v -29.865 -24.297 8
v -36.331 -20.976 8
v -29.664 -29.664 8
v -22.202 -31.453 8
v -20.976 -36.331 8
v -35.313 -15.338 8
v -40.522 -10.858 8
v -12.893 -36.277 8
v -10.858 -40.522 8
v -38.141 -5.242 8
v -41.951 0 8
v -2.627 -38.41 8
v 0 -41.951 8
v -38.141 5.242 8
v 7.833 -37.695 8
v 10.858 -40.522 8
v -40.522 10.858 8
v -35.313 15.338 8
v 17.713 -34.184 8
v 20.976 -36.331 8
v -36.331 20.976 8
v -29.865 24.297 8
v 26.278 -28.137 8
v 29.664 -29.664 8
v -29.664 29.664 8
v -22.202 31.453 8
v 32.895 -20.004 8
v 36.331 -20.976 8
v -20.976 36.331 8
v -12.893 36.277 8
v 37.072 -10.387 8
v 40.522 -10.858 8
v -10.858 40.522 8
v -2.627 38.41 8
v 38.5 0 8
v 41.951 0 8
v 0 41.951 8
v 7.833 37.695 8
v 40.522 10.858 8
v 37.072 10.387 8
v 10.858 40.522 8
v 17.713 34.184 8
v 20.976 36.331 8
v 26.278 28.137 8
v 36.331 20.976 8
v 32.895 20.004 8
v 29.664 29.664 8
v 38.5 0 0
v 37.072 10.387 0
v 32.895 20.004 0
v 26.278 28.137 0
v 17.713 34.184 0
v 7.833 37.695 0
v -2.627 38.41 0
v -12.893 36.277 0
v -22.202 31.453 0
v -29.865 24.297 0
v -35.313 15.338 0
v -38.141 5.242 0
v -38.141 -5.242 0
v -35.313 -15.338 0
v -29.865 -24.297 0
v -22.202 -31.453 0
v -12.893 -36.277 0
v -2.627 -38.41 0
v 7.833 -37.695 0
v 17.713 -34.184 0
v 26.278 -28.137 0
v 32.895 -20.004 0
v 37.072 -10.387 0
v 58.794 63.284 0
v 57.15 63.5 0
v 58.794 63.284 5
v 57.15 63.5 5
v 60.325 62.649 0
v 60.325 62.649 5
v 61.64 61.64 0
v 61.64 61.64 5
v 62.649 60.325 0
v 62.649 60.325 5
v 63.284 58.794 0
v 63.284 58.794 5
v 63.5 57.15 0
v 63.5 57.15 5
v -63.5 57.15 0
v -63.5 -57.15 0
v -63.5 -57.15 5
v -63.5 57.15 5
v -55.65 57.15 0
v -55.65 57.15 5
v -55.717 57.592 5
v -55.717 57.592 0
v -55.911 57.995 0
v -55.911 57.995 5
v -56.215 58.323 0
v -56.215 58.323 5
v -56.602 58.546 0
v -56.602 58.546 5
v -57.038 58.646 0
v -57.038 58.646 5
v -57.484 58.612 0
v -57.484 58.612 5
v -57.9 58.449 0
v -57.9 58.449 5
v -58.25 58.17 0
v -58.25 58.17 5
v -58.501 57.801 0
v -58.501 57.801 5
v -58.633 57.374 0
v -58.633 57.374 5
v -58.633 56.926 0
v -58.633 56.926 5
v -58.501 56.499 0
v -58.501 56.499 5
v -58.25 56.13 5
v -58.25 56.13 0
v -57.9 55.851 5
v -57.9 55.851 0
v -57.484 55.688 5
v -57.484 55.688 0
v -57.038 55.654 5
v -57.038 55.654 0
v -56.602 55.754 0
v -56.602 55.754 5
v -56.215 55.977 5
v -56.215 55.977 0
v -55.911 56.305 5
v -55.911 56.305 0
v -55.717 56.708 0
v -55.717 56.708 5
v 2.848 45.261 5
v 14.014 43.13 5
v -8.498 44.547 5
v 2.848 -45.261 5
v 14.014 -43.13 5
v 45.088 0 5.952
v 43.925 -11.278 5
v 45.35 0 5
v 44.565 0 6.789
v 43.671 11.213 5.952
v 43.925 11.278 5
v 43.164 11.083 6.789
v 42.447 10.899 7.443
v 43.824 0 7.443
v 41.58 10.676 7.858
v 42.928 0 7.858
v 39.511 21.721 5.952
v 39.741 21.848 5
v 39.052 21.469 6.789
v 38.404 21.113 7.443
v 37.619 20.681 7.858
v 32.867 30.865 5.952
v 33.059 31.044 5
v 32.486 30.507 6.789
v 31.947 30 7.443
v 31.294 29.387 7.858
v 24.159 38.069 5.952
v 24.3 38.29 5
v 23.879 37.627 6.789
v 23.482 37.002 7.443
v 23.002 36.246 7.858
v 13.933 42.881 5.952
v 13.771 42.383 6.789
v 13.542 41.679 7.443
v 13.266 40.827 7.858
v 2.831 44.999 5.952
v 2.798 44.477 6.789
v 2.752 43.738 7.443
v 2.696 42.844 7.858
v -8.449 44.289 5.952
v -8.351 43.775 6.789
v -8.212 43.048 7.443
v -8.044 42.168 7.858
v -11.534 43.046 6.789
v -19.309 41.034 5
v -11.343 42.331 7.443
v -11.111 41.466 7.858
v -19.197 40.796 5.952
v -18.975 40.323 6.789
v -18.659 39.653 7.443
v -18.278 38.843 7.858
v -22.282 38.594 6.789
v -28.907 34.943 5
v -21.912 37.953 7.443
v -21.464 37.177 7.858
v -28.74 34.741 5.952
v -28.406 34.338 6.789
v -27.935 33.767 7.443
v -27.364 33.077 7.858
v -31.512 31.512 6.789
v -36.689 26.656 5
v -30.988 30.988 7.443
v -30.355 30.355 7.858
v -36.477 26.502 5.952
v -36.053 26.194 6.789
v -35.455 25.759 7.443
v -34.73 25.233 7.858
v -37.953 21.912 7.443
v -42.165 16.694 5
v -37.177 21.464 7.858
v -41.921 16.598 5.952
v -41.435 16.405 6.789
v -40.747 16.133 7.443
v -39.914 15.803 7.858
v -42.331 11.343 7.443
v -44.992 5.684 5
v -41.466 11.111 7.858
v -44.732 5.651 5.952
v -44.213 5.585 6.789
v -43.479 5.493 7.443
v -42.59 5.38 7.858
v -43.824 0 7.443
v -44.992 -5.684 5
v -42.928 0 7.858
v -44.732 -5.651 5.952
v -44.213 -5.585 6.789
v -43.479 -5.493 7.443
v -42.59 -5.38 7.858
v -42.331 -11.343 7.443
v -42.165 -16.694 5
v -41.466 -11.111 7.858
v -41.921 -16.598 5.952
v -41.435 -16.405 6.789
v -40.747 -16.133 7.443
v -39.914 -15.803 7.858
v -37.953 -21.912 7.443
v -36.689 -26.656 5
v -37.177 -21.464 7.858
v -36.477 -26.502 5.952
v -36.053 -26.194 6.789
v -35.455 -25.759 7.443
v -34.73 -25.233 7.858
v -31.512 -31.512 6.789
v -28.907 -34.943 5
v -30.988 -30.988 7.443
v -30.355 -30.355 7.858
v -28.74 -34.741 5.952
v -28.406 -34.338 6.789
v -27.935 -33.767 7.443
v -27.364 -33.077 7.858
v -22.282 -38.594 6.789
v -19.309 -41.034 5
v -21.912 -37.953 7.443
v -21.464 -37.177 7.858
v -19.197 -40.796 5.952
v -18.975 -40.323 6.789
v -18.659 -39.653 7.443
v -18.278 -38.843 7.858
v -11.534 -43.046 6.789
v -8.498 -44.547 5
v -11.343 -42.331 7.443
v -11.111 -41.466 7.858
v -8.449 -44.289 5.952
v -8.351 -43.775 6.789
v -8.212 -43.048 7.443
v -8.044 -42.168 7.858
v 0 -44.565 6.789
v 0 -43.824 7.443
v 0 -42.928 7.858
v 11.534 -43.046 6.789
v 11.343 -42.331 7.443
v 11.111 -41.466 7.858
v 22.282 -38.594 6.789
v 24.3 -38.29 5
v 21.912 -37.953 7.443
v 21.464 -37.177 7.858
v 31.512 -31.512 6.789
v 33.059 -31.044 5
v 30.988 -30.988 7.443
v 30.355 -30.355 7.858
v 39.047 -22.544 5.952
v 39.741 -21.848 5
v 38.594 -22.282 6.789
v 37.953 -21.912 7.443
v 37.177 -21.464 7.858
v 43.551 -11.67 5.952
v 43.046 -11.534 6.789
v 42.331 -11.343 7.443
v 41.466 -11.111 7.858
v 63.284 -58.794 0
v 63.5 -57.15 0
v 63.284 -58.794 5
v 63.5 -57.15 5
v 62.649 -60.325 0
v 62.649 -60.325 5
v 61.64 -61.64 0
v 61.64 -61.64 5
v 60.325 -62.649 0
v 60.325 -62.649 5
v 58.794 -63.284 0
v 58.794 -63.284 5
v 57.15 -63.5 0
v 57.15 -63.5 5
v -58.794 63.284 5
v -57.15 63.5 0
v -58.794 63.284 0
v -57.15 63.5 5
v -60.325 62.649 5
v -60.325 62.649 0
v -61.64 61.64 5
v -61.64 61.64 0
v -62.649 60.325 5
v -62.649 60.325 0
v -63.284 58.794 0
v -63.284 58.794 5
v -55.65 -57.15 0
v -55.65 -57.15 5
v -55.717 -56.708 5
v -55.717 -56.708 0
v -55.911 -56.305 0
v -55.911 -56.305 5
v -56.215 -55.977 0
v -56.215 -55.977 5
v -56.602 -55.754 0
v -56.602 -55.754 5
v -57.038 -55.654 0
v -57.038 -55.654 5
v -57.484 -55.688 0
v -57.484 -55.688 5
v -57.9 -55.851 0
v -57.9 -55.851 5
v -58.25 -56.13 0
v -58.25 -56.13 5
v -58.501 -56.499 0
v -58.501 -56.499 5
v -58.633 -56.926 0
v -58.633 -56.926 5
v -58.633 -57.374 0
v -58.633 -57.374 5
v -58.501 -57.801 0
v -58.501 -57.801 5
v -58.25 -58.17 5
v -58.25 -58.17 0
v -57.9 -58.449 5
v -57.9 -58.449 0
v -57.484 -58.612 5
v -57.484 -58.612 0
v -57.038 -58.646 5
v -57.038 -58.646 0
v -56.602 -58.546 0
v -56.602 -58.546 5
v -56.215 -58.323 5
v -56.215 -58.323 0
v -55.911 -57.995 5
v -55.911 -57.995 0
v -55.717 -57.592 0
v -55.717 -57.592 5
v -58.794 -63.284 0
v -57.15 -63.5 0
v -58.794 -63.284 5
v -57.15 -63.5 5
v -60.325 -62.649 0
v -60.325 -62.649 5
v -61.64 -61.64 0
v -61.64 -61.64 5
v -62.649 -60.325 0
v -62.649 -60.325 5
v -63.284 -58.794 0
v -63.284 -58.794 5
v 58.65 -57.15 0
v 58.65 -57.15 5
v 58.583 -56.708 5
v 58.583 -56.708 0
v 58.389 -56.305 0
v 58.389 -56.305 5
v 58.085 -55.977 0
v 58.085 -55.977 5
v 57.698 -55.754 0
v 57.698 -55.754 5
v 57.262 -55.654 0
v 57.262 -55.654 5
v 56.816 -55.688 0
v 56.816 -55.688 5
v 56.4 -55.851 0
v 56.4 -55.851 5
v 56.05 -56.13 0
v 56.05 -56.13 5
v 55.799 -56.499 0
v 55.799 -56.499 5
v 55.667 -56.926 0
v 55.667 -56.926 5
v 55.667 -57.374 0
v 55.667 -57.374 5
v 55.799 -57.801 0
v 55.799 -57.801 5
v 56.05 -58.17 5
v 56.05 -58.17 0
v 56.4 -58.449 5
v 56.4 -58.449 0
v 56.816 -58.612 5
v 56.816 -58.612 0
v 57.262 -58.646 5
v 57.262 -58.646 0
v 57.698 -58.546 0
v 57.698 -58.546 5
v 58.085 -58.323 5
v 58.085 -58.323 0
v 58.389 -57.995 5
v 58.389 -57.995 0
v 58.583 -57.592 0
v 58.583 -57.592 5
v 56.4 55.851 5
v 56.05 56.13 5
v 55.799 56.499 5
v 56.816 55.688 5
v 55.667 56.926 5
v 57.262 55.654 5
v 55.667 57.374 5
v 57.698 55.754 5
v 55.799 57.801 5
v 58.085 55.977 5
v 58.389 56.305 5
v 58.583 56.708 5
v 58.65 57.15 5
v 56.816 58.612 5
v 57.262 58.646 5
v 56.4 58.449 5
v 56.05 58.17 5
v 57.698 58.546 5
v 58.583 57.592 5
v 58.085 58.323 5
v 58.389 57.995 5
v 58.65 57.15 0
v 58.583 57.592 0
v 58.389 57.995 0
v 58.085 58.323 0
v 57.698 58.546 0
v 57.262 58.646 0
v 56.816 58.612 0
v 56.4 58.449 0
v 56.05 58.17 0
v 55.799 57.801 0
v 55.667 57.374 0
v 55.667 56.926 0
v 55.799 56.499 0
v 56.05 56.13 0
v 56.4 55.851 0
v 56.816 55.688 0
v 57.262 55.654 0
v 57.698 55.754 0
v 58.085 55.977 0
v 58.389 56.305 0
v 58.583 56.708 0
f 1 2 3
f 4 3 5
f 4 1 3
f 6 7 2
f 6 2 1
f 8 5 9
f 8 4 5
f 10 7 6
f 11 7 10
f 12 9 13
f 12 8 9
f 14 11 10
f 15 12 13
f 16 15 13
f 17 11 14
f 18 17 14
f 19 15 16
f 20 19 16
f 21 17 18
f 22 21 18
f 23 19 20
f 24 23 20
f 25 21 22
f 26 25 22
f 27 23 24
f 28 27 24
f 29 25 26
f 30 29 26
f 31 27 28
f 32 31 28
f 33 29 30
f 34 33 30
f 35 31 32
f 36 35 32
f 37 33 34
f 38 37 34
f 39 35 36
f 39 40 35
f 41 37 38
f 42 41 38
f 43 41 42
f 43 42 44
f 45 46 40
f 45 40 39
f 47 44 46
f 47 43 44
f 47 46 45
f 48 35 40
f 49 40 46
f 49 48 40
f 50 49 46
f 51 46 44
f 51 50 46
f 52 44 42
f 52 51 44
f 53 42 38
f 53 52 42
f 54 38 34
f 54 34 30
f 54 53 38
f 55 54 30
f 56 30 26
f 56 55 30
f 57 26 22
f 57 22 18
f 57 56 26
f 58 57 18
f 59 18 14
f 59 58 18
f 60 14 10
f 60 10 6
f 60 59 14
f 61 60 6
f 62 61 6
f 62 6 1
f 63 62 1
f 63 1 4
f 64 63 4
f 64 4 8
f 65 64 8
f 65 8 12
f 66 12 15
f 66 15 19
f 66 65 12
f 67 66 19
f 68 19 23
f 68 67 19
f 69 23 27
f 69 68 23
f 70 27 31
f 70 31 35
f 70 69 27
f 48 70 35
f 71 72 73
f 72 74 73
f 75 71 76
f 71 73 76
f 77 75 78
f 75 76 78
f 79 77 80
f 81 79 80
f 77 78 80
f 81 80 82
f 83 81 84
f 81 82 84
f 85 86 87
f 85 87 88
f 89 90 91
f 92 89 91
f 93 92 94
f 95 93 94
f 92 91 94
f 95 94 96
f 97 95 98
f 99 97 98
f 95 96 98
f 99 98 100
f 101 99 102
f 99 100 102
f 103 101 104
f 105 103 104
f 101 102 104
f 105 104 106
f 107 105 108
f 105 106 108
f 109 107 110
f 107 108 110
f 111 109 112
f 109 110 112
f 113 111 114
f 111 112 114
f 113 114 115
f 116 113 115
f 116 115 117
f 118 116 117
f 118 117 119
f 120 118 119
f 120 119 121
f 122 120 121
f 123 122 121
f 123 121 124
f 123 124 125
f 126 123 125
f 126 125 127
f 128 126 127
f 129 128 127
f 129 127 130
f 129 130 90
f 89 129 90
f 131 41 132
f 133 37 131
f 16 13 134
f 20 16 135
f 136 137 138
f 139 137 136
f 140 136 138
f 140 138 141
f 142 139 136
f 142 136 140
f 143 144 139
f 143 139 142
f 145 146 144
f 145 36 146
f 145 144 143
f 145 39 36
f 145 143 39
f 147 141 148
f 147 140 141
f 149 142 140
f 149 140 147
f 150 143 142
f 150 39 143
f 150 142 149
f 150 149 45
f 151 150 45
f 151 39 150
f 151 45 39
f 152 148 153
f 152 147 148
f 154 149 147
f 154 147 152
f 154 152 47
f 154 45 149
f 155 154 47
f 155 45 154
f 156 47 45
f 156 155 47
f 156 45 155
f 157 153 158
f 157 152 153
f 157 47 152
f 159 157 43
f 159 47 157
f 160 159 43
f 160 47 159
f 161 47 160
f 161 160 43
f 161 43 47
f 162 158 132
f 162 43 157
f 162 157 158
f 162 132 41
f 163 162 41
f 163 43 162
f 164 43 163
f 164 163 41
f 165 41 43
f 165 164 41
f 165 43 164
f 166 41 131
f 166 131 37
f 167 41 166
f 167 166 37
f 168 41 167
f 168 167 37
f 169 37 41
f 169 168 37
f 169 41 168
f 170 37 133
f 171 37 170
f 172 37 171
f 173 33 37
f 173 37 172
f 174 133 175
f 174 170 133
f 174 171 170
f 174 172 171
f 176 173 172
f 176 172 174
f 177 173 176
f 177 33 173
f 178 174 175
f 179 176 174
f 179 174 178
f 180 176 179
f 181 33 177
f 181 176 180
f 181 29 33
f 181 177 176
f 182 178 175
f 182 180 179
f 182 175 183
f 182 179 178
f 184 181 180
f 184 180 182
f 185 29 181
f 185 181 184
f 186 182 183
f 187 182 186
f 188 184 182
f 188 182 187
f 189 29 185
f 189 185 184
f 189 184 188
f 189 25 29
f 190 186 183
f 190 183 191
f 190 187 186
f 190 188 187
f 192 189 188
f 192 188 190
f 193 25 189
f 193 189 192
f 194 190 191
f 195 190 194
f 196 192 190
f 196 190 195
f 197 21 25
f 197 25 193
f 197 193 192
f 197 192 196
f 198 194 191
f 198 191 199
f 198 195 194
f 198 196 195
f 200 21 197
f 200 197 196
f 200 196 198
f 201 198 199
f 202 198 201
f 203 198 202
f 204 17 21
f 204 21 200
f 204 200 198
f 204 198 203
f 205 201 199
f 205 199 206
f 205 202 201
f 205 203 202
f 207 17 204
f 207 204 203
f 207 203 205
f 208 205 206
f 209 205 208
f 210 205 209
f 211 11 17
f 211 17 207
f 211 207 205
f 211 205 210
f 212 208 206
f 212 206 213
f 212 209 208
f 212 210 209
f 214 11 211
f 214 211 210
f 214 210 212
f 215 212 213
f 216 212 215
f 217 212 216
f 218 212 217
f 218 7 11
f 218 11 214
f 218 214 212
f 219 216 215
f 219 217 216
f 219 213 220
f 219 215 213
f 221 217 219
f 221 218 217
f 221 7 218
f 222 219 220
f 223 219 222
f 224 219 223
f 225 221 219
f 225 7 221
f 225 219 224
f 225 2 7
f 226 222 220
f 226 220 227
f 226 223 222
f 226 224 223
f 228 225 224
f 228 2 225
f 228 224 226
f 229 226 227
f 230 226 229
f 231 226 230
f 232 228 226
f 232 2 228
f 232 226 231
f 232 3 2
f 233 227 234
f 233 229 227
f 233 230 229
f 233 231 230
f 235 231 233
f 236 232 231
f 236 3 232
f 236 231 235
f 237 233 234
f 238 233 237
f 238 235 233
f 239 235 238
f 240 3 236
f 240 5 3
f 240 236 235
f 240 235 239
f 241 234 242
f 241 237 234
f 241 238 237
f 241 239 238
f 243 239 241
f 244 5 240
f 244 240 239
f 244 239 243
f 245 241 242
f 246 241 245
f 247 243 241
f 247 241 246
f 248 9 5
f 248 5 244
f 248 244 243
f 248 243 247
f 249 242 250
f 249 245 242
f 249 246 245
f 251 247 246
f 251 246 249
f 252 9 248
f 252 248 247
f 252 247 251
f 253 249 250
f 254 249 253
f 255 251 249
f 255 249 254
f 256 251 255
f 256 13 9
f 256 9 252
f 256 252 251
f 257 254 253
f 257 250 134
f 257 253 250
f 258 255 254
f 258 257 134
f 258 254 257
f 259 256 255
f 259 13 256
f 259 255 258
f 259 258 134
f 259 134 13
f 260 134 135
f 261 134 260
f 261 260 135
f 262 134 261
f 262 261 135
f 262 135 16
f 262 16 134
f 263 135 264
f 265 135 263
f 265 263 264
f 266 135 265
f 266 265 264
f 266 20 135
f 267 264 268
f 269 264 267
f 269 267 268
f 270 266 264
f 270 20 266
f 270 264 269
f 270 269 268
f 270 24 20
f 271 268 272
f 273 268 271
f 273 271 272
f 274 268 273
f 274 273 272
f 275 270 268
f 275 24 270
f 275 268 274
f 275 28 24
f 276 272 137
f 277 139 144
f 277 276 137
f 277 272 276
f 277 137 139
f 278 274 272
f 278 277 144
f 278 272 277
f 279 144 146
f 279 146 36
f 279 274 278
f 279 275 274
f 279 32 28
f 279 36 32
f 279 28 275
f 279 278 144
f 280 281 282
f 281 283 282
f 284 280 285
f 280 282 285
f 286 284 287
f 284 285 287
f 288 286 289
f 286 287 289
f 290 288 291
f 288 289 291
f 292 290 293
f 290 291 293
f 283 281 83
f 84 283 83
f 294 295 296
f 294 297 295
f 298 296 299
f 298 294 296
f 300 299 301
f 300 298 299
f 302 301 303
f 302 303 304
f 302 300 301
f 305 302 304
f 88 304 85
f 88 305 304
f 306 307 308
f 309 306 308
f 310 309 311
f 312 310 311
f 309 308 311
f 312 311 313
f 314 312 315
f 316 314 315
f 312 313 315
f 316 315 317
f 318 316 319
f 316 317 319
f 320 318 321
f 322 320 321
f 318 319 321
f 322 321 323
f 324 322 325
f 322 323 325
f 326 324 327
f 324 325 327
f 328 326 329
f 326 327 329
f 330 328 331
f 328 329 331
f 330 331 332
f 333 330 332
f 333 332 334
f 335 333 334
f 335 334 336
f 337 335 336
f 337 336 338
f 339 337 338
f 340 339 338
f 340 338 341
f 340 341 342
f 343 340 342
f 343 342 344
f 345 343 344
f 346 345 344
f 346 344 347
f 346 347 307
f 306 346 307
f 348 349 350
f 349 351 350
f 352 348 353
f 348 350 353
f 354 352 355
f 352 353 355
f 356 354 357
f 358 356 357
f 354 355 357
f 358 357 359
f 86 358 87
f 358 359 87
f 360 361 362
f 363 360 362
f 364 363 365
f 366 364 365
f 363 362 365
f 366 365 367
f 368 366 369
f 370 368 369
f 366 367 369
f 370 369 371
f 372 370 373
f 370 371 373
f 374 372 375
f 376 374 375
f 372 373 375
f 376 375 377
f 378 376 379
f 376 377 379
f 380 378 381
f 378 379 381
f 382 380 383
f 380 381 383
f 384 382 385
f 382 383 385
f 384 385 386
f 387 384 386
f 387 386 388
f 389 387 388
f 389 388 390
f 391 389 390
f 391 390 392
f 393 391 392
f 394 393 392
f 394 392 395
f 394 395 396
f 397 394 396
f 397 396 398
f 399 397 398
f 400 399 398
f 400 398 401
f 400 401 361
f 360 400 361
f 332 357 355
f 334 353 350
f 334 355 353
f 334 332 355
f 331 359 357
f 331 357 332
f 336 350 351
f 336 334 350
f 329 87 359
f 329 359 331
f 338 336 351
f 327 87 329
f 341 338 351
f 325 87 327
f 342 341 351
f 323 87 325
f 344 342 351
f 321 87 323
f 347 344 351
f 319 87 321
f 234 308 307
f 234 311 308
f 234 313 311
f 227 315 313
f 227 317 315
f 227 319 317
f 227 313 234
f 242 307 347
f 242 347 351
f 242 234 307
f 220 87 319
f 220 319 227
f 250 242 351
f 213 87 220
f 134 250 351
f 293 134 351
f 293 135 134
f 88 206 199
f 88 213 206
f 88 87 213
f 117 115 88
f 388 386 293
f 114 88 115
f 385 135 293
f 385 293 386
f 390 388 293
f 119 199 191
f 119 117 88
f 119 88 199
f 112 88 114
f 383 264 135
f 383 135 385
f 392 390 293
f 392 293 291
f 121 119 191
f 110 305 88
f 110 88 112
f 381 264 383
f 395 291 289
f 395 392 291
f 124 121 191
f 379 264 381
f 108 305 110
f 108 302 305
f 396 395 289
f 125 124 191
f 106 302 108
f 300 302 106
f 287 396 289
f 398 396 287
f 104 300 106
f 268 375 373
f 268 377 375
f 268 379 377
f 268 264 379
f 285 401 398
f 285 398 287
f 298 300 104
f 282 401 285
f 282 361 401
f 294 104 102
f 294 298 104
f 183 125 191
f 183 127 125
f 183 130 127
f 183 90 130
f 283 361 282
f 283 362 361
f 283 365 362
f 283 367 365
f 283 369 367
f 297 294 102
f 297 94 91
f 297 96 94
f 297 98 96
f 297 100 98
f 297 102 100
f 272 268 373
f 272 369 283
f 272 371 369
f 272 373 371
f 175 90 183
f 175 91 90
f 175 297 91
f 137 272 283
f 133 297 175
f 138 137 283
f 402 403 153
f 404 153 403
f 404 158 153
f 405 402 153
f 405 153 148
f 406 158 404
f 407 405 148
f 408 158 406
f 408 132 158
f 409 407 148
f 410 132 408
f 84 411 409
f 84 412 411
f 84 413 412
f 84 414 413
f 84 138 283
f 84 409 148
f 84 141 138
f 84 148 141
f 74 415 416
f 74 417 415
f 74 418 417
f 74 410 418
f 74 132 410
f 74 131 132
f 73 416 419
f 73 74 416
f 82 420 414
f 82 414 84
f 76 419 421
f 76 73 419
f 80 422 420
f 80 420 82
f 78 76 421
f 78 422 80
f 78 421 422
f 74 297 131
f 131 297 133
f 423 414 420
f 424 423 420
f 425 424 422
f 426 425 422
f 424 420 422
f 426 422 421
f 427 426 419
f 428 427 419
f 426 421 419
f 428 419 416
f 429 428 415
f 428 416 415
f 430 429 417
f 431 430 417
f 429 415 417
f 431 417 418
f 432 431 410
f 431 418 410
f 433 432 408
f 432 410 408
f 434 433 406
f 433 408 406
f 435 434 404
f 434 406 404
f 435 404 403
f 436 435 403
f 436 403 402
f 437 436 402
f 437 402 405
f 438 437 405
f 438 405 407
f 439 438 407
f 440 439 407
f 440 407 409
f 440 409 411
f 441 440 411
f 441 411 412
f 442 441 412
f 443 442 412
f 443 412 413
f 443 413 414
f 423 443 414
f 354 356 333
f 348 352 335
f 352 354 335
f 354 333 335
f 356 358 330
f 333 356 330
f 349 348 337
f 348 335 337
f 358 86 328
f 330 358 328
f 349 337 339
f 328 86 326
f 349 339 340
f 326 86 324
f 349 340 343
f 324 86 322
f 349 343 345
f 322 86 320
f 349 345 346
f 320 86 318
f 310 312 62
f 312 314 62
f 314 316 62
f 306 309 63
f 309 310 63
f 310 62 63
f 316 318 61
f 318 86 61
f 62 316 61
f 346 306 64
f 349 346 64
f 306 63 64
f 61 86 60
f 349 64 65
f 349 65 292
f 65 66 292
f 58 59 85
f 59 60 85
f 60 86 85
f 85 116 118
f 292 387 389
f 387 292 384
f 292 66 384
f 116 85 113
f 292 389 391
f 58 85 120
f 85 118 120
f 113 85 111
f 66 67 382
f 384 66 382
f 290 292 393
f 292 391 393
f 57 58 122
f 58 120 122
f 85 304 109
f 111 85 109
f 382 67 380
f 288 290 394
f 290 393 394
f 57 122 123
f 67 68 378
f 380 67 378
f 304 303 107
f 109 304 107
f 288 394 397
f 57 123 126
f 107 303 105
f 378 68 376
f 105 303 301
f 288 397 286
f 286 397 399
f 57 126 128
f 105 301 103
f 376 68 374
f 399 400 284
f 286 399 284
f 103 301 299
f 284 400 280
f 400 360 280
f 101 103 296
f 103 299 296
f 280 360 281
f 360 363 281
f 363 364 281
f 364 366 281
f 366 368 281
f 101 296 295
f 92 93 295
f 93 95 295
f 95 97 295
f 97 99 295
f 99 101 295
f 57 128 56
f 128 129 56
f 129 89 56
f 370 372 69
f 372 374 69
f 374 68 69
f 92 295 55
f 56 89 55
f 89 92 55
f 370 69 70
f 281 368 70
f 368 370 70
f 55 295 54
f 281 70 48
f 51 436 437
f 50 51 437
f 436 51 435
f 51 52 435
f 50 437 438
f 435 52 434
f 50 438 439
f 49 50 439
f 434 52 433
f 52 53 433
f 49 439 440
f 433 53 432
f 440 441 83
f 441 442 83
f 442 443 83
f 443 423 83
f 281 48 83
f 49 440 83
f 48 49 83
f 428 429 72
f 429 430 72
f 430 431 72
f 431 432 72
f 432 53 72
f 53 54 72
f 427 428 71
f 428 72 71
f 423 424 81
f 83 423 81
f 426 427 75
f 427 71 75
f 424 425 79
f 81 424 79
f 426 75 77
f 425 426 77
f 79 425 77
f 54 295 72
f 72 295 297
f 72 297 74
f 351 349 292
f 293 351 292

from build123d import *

# Parameters (mm, degrees)
SKETCH1_W           = 127
SKETCH1_H           = 127
SKETCH1_W_2         = 121
SKETCH1_H_2         = 121
SKETCH1_R           = 38.5
BOSS_EXTRUDE1_DEPTH = 5
SKETCH3_R           = 45.35
SKETCH3_R_2         = 38.5
BOSS_EXTRUDE2_DEPTH = 3
FILLET1_R           = 6.35
FILLET2_R           = 3.425
SKETCH5_R           = 1.5
CUT_EXTRUDE2_DEPTH  = 90.94164775


with BuildPart() as part:
    # Sketch1 → Boss-Extrude1 (new body)
    # profile 1 of 2: a face of its own
    with BuildSketch(Plane.XY):
        Rectangle(SKETCH1_W, SKETCH1_H)
        Rectangle(SKETCH1_W_2, SKETCH1_H_2, mode=Mode.SUBTRACT)
    # profile 2 of 2: a face of its own
    with BuildSketch(Plane.XY):
        Rectangle(SKETCH1_W_2, SKETCH1_H_2)
        Circle(SKETCH1_R, mode=Mode.SUBTRACT)
    extrude(amount=BOSS_EXTRUDE1_DEPTH)

    # Sketch3 → Boss-Extrude2 (add)
    with BuildSketch(Plane.XY.offset(5)):
        Circle(SKETCH3_R)
        Circle(SKETCH3_R_2, mode=Mode.SUBTRACT)
    extrude(amount=BOSS_EXTRUDE2_DEPTH)

    # Fillet1
    fillet1_edges = [part.edges().sort_by_distance(p)[0] for p in [
        (-63.5, 63.5, 2.5),
        (63.5, 63.5, 2.5),
        (63.5, -63.5, 2.5),
        (-63.5, -63.5, 2.5),
    ]]
    fillet(fillet1_edges, radius=FILLET1_R)

    # Fillet2
    # the kernel refuses this fillet: 3.425 mm, written as the material it takes off along each edge
    with BuildSketch(Plane(origin=(0, 0, 8), x_dir=(1, 0, 0), z_dir=(0, -1, 0))) as fillet2_piece_1:
        with BuildLine():
            CenterArc((41.951470906, -3.425), FILLET2_R, 7.12806839, 82.87193161)
            Line((41.951470906, 0), (41.951470906, 0.0685))
            Line((41.951470906, 0.0685), (45.35, 0.0685))
            Line((45.35, 0.0685), (45.4185, 0))
            ThreePointArc((45.4185, 0), (45.4185, -1.5), (45.417970582, -2.9915))
            Line((45.417970582, -2.9915), (45.35, -3))
        make_face()
    revolve(axis=Axis((0, 0, 8), (0, 0, 1)), mode=Mode.SUBTRACT)

    # Sketch5 → Cut-Extrude2 (cut, through all)
    with BuildSketch(Plane.XY.offset(5)):
        with Locations((-57.15, 57.15)):
            Circle(SKETCH5_R)
        with Locations((-57.15, -57.15)):
            Circle(SKETCH5_R)
        with Locations((57.15, -57.15)):
            Circle(SKETCH5_R)
        with Locations((57.15, 57.15)):
            Circle(SKETCH5_R)
    extrude(amount=-CUT_EXTRUDE2_DEPTH, mode=Mode.SUBTRACT)


solid = part.part
